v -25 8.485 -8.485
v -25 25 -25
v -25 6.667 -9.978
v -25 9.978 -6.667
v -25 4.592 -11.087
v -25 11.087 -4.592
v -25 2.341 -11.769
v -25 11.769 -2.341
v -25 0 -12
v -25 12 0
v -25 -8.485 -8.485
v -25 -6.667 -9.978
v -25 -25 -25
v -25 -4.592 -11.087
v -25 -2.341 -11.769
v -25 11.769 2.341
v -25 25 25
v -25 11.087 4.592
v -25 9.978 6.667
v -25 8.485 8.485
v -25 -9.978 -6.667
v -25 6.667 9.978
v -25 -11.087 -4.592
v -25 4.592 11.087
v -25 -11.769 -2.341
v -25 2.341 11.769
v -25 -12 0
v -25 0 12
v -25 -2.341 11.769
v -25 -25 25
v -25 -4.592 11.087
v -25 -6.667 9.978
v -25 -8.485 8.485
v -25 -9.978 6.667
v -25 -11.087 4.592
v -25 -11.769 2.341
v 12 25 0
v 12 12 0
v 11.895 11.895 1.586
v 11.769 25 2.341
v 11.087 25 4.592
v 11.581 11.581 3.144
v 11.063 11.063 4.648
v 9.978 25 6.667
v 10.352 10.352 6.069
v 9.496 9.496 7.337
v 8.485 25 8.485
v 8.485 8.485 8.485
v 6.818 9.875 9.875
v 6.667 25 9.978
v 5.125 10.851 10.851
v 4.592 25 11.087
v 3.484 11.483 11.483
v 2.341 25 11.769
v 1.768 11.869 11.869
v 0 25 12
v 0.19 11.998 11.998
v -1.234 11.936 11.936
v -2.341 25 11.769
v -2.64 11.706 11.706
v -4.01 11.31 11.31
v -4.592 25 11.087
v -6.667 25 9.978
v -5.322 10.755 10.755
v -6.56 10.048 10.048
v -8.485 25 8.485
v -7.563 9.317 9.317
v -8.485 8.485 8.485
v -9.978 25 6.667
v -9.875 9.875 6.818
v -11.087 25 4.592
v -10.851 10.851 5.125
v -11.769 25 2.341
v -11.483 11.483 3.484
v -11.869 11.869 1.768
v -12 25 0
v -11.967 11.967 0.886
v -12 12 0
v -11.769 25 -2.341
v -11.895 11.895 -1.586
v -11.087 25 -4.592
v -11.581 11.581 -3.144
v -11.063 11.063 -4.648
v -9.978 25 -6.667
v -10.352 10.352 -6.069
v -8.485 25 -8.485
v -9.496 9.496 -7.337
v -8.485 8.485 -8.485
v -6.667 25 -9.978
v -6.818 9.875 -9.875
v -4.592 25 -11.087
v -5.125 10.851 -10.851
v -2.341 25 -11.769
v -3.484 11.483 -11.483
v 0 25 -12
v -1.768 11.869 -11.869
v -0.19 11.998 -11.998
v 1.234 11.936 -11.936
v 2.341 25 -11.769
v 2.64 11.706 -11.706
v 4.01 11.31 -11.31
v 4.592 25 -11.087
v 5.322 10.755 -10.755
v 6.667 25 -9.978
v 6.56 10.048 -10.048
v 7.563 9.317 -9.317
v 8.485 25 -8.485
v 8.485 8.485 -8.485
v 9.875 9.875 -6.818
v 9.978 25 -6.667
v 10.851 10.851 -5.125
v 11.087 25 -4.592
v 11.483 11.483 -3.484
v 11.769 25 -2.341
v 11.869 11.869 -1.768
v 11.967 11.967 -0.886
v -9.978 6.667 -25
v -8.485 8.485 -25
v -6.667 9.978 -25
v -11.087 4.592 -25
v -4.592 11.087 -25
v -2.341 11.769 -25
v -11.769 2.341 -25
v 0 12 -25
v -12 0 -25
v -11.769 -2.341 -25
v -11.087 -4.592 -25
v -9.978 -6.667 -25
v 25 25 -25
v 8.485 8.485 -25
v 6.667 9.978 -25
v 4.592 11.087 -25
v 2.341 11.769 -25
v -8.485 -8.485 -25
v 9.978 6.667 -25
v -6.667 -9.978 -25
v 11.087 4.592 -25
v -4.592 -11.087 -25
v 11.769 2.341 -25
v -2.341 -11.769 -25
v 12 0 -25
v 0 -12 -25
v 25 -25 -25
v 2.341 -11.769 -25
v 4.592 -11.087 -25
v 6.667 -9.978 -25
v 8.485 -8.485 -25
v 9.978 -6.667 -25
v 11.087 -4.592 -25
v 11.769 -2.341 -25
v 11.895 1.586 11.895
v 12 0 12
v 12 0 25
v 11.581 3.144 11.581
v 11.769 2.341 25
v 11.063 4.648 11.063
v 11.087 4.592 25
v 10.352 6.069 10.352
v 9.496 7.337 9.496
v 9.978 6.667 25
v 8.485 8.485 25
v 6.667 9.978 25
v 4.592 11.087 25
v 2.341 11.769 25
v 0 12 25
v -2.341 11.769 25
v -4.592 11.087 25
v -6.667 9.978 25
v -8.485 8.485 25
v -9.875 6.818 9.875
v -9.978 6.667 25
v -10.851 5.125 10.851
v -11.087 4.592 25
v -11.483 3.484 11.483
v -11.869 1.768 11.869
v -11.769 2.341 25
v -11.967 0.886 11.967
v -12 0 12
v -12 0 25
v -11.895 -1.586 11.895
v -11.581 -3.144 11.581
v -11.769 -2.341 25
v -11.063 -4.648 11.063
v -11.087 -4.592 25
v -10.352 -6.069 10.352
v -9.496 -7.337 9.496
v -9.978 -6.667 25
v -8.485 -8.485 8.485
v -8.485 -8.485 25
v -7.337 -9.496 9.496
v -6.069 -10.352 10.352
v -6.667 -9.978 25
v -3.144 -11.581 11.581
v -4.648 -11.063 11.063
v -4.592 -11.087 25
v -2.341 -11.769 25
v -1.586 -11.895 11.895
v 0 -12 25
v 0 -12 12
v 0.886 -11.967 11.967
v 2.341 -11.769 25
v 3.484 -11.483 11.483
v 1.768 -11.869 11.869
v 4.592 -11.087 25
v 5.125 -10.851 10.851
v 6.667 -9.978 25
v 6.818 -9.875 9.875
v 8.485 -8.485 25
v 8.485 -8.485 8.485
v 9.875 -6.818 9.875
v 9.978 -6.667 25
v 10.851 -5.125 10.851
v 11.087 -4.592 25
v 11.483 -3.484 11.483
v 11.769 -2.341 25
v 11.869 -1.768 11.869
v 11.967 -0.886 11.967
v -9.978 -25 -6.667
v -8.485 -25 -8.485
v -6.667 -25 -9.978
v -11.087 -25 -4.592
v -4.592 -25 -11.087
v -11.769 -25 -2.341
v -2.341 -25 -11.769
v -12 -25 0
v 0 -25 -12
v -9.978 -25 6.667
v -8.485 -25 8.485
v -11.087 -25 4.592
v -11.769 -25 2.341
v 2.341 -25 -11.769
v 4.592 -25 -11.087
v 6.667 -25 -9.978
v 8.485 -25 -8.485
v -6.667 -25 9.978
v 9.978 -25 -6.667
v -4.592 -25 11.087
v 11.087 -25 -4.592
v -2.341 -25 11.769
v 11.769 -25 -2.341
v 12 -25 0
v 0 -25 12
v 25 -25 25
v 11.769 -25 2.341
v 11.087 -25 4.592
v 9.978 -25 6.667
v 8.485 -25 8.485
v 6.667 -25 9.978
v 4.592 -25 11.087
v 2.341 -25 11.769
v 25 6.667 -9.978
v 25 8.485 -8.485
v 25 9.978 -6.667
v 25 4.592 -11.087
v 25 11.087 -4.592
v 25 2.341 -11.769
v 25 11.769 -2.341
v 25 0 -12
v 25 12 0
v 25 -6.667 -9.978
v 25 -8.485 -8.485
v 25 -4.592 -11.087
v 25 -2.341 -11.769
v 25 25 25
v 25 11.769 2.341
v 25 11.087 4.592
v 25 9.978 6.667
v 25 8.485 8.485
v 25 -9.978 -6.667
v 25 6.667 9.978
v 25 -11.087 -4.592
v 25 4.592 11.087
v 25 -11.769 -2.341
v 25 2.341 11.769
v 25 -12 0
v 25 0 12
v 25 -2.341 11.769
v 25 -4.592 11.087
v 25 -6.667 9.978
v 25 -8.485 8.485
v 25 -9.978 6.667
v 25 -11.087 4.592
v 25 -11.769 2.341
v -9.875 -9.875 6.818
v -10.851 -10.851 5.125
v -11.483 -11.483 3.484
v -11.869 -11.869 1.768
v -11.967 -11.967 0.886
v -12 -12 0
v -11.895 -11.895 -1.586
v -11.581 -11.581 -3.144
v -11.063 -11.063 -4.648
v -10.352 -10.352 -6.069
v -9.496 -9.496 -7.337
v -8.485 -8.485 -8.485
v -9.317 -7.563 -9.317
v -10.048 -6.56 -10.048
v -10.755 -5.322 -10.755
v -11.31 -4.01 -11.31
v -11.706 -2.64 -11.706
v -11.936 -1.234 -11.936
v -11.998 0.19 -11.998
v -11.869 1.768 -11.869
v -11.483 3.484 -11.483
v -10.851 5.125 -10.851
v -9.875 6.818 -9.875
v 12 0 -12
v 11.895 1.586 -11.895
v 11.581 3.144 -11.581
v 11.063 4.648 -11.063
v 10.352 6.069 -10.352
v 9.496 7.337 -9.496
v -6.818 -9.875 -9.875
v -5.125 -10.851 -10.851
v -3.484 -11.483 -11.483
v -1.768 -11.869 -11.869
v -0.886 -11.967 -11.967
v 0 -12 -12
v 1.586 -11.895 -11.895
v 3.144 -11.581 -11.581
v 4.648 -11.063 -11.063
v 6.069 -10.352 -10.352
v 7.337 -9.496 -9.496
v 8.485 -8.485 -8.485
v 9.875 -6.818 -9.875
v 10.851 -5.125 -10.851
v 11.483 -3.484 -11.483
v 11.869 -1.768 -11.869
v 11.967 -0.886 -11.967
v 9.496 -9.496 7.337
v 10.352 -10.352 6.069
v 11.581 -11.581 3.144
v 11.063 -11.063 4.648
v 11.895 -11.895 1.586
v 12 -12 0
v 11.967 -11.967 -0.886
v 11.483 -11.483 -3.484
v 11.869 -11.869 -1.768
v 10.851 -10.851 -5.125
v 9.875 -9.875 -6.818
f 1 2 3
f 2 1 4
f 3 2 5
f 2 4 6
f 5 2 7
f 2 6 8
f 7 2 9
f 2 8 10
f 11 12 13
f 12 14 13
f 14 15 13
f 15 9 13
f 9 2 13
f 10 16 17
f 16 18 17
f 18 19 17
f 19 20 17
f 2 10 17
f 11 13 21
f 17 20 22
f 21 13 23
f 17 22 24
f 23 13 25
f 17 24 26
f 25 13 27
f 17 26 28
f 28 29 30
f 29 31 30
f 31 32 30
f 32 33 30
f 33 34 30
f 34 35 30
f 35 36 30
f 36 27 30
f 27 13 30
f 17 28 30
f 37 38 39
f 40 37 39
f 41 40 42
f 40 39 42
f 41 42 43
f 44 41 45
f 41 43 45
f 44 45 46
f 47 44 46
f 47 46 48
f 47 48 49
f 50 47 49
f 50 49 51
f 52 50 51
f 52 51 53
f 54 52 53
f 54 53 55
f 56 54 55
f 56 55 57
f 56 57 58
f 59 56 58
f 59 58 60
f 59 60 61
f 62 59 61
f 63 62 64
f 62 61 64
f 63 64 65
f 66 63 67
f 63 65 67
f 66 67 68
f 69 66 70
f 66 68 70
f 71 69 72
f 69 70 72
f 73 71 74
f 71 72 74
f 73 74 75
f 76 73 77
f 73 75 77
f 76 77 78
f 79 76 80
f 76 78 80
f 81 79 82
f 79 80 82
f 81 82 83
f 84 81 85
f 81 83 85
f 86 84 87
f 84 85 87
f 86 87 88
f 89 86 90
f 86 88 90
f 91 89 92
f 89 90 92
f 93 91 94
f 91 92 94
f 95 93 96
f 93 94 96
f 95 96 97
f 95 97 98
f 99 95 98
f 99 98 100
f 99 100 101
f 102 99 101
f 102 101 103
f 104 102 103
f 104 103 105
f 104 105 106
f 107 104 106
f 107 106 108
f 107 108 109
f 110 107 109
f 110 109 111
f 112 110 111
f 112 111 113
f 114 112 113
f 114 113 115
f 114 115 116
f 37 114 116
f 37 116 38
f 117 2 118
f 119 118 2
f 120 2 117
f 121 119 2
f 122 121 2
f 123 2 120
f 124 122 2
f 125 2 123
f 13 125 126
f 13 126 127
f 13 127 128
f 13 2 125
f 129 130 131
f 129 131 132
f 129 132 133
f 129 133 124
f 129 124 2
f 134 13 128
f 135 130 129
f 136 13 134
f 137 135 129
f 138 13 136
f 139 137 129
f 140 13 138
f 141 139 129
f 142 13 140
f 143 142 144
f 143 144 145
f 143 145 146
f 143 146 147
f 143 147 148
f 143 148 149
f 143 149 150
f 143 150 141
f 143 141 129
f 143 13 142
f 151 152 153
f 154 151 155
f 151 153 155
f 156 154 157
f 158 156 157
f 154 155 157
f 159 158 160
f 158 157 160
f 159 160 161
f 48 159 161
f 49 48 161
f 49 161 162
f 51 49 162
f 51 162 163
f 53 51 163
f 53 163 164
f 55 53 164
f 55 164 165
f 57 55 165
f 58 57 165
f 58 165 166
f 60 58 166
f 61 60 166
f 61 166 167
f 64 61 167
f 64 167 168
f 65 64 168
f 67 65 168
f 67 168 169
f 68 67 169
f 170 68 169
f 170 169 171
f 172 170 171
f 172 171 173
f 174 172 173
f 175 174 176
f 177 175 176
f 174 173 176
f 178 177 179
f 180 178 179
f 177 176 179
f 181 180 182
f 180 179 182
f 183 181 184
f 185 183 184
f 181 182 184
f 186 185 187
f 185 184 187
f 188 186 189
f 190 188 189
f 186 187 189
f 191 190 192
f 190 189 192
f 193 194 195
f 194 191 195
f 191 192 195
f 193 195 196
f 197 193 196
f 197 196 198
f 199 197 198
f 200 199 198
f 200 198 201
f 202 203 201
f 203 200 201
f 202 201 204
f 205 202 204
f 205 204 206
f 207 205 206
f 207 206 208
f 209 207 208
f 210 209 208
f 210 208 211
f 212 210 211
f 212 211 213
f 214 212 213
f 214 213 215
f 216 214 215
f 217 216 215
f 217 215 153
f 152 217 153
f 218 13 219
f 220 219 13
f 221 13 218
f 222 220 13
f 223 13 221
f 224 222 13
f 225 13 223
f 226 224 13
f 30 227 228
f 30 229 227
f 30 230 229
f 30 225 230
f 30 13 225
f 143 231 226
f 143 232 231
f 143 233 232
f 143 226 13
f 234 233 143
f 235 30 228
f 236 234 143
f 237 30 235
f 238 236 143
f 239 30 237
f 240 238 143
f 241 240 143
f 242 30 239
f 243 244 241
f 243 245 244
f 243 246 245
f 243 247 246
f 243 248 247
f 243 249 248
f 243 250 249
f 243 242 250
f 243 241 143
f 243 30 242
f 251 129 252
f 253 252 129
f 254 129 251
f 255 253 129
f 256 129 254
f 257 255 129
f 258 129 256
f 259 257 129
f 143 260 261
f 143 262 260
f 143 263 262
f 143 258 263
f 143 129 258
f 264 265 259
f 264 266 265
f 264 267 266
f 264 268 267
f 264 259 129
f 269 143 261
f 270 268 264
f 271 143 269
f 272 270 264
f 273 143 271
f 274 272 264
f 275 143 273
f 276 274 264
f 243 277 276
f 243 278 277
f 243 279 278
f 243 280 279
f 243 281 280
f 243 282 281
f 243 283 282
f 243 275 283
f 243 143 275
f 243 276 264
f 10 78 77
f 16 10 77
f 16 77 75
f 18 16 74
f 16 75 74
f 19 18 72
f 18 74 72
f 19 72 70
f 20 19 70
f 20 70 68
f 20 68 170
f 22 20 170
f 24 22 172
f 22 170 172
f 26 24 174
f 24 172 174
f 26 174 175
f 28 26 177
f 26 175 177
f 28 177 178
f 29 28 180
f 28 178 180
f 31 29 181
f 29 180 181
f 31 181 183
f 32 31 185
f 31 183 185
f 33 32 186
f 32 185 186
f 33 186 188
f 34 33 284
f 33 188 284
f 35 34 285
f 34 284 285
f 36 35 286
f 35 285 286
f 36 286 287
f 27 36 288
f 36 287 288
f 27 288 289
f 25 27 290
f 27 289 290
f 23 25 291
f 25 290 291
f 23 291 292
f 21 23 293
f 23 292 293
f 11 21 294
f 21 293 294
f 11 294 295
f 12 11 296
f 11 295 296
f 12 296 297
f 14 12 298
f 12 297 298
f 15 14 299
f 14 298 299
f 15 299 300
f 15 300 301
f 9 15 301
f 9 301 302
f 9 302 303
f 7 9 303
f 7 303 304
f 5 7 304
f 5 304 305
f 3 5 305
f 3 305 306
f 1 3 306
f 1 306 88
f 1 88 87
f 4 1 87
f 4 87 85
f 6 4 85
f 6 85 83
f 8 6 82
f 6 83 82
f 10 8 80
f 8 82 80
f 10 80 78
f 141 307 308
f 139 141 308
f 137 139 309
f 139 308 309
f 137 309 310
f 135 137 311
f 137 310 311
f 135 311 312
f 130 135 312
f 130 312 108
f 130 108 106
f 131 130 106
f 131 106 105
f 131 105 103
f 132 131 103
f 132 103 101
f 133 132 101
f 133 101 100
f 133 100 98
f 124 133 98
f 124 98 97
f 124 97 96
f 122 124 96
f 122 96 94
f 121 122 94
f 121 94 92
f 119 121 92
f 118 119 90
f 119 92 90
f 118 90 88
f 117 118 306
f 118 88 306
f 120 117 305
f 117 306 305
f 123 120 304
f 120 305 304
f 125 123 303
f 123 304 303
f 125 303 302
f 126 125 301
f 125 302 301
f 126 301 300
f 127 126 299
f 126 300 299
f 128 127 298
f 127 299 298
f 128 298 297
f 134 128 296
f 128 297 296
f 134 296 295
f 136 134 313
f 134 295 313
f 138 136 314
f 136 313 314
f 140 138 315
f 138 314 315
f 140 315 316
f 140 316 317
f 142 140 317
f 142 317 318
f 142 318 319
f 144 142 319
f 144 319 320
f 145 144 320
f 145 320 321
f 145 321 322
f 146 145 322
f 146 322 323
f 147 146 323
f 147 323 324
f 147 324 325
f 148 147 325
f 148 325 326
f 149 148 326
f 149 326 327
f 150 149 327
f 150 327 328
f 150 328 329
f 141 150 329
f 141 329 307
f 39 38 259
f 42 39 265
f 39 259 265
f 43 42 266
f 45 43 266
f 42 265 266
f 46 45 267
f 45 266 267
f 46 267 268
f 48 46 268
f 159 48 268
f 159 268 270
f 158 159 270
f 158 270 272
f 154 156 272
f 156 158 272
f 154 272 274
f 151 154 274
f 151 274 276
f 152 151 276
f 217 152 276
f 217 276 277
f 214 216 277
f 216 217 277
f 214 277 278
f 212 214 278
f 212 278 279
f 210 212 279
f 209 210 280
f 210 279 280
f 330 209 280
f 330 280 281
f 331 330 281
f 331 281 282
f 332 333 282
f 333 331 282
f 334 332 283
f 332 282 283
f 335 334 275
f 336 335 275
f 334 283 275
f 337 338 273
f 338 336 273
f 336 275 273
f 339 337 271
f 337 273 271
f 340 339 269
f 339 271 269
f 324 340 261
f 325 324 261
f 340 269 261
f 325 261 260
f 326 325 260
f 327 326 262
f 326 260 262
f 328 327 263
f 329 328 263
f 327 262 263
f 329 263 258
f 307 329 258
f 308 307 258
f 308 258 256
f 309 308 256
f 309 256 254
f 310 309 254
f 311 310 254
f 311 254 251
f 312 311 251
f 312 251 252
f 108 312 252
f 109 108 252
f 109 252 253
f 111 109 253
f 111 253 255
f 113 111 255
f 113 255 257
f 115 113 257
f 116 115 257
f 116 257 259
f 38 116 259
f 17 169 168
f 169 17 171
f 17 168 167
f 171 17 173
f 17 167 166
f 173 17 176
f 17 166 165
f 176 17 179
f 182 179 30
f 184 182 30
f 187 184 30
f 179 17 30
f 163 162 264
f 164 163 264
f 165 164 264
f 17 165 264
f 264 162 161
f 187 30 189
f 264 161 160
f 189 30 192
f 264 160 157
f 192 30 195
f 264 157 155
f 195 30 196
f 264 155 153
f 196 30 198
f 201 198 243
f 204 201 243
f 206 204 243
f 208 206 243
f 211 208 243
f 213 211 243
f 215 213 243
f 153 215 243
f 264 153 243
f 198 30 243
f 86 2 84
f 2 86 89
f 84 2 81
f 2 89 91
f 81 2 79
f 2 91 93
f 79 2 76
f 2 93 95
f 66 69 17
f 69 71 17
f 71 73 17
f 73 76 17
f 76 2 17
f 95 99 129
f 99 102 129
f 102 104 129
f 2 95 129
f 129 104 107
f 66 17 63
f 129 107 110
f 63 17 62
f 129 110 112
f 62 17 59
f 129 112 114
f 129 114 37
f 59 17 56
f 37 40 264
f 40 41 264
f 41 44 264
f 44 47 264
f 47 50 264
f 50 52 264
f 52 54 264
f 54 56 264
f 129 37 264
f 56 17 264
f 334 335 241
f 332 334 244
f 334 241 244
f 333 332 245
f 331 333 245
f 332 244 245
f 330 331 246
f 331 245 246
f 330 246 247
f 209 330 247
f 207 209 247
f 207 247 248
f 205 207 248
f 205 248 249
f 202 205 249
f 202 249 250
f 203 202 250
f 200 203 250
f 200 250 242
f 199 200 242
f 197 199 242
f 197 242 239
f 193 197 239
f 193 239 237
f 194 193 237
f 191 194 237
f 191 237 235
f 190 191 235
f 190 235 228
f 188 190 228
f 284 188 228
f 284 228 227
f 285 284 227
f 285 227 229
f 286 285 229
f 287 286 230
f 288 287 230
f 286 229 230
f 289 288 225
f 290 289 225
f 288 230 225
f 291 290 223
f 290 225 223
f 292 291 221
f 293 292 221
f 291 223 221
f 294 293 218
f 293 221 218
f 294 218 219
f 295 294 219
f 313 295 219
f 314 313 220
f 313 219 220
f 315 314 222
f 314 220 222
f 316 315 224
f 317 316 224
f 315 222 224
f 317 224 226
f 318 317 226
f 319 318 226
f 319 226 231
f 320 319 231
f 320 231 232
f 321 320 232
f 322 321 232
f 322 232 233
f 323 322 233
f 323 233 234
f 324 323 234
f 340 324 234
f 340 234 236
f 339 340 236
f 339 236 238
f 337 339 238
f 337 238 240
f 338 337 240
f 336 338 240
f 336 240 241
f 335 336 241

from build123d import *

# Parameters (mm, degrees)
F0_W          = 50
F0_H          = 50
F1_DEPTH      = 25
F1_DEPTH_BACK = 25
F2_R          = 12
F3_DEPTH      = 50
F4_R          = 12
F5_DEPTH      = 50
F6_R          = 12
F7_DEPTH      = 50


with BuildPart() as f1:
    # F0 (on Front) → F1 (new body, two sides)
    with BuildSketch(Plane.XZ) as f1_sk:
        Rectangle(F0_W, F0_H)
    extrude(amount=F1_DEPTH)
    extrude(f1_sk.sketch, amount=-F1_DEPTH_BACK)

    # F2 (on face) → F3 (cut)
    with BuildSketch(Plane.XZ.offset(25)):
        Circle(F2_R)
    extrude(amount=-F3_DEPTH, mode=Mode.SUBTRACT)

    # F4 (on face) → F5 (cut)
    with BuildSketch(Plane.XY.offset(25)):
        Circle(F4_R)
    extrude(amount=-F5_DEPTH, mode=Mode.SUBTRACT)

    # F6 (on face) → F7 (cut)
    with BuildSketch(Plane.YZ.offset(25)):
        Circle(F6_R)
    extrude(amount=-F7_DEPTH, mode=Mode.SUBTRACT)


solid = f1.part
